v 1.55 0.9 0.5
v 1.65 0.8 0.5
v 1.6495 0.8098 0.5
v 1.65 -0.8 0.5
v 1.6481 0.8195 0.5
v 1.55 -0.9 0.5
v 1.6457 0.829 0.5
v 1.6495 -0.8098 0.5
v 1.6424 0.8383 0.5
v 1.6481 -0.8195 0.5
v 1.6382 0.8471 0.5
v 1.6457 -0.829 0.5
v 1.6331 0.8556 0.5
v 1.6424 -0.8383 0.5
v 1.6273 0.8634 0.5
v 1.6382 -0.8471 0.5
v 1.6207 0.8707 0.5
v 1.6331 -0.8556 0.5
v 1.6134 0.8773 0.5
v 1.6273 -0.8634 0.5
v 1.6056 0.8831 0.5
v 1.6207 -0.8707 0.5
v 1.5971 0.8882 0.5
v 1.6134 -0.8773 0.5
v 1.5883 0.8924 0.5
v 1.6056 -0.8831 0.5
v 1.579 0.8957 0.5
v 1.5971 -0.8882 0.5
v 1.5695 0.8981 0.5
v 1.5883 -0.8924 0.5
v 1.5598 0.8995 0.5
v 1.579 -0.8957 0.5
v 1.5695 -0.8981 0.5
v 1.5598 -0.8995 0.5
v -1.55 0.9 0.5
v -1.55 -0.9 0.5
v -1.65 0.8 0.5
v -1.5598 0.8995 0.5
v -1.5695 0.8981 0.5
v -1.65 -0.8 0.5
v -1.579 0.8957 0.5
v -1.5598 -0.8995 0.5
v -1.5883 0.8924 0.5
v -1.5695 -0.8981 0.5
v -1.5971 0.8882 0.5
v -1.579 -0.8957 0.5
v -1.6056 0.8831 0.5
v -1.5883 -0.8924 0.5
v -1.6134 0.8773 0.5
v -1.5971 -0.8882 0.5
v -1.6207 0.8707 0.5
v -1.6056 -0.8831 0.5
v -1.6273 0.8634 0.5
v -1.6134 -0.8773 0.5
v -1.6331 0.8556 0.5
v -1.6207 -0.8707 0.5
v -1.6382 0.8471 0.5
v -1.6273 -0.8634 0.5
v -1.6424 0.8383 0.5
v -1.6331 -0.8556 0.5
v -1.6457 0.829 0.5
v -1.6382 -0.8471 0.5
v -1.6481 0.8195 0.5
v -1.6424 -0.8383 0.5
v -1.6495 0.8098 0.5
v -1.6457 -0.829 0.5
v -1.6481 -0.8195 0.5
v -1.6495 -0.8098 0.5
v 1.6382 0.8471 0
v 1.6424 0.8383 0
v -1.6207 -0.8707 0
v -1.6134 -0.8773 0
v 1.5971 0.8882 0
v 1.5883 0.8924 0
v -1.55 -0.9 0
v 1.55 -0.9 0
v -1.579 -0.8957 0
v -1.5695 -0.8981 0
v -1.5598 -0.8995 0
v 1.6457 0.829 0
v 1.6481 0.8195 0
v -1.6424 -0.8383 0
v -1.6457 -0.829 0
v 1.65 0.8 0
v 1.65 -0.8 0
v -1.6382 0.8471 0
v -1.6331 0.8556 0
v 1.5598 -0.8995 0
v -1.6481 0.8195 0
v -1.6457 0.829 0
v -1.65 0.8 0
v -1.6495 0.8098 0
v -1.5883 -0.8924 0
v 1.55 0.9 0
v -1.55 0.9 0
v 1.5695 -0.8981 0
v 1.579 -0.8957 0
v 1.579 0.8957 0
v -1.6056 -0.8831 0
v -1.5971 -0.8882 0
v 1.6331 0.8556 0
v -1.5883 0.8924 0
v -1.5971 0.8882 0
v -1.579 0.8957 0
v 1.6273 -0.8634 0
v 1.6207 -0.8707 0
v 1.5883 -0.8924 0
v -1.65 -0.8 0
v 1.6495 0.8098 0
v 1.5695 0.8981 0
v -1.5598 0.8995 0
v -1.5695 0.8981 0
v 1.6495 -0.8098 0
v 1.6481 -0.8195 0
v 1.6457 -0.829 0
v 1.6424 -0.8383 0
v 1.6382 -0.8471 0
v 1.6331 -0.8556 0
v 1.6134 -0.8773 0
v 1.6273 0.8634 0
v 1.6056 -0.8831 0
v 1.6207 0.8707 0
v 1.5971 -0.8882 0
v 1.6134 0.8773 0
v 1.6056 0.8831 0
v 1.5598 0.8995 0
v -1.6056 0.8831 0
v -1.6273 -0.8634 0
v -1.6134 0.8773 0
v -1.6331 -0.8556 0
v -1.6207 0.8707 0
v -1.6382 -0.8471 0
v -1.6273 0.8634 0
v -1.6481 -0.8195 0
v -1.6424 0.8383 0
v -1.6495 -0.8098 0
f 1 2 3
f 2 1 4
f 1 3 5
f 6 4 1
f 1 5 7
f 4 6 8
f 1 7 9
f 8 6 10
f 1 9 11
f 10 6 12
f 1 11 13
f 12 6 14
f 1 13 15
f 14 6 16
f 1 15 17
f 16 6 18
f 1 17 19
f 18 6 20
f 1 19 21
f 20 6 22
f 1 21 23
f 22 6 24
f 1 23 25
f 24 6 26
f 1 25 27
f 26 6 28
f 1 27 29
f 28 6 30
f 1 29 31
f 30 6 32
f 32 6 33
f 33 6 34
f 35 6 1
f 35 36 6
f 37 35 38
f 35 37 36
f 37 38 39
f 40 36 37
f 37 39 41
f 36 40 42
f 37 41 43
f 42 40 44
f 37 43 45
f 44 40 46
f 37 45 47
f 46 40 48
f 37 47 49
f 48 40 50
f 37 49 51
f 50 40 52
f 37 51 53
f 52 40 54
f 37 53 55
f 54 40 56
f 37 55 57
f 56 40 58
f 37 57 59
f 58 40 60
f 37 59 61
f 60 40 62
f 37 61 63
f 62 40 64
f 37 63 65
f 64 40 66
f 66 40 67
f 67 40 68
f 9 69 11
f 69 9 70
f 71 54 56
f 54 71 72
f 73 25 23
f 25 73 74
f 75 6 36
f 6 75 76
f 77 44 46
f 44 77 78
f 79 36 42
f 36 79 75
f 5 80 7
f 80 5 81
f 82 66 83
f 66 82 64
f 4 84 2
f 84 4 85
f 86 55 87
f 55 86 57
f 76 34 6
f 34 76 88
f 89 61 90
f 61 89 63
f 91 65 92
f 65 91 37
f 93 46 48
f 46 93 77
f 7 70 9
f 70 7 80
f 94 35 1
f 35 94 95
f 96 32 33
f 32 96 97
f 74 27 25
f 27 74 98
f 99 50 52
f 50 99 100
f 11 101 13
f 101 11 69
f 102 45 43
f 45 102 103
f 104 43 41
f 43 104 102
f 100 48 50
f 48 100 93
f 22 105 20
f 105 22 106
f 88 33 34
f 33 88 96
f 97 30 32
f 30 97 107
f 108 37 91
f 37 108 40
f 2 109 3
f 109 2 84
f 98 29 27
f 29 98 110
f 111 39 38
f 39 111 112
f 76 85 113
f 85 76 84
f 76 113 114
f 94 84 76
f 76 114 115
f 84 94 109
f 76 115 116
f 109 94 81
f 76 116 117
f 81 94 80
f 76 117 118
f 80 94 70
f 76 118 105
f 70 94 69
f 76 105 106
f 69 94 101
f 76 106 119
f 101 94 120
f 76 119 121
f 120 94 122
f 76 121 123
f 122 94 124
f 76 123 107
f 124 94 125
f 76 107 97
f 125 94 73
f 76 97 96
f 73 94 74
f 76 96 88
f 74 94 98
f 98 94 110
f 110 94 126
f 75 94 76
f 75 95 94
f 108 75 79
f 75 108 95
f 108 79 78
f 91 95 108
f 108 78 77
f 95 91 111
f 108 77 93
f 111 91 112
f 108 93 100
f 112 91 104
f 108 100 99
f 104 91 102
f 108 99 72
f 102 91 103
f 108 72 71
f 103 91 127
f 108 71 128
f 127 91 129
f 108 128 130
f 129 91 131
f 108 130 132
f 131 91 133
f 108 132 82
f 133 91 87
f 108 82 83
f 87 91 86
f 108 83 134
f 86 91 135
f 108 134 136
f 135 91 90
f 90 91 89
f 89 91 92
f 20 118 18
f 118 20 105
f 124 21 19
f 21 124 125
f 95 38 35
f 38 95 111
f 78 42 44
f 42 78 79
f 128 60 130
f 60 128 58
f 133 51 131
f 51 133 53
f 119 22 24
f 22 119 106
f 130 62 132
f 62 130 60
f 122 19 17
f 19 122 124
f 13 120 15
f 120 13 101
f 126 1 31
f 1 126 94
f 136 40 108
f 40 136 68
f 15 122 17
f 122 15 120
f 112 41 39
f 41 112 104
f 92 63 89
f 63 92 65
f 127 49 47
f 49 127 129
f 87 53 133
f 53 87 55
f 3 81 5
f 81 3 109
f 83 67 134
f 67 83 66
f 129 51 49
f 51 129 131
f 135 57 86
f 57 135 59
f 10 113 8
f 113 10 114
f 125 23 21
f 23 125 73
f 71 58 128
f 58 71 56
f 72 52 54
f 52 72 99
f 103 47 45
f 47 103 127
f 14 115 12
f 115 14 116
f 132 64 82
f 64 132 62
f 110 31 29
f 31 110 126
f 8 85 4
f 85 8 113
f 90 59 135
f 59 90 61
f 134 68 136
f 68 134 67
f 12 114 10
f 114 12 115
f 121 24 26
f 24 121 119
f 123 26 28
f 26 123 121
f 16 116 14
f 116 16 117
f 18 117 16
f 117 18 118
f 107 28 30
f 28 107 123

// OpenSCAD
module chamfered_plate() {
    difference() {
        // Main block with chamfered edges
        hull() {
            for (x = [-1.55, 1.55])
                for (y = [-0.8, 0.8])
                    translate([x, y, 0])
                        cylinder(h = 0.5, r = 0.1, $fn = 64);
        }
        // Recessed panel with raised border
        translate([0, 0, 0.1])
            offset(r = 0.1)
                offset(delta = -0.1)
                    hull() {
                        for (x = [-1.45, 1.45])
                            for (y = [-0.7, 0.7])
                                translate([x, y, 0])
                                    cylinder(h = 0.3, r = 0.1, $fn = 64);
                    }
    }
}

chamfered_plate();
